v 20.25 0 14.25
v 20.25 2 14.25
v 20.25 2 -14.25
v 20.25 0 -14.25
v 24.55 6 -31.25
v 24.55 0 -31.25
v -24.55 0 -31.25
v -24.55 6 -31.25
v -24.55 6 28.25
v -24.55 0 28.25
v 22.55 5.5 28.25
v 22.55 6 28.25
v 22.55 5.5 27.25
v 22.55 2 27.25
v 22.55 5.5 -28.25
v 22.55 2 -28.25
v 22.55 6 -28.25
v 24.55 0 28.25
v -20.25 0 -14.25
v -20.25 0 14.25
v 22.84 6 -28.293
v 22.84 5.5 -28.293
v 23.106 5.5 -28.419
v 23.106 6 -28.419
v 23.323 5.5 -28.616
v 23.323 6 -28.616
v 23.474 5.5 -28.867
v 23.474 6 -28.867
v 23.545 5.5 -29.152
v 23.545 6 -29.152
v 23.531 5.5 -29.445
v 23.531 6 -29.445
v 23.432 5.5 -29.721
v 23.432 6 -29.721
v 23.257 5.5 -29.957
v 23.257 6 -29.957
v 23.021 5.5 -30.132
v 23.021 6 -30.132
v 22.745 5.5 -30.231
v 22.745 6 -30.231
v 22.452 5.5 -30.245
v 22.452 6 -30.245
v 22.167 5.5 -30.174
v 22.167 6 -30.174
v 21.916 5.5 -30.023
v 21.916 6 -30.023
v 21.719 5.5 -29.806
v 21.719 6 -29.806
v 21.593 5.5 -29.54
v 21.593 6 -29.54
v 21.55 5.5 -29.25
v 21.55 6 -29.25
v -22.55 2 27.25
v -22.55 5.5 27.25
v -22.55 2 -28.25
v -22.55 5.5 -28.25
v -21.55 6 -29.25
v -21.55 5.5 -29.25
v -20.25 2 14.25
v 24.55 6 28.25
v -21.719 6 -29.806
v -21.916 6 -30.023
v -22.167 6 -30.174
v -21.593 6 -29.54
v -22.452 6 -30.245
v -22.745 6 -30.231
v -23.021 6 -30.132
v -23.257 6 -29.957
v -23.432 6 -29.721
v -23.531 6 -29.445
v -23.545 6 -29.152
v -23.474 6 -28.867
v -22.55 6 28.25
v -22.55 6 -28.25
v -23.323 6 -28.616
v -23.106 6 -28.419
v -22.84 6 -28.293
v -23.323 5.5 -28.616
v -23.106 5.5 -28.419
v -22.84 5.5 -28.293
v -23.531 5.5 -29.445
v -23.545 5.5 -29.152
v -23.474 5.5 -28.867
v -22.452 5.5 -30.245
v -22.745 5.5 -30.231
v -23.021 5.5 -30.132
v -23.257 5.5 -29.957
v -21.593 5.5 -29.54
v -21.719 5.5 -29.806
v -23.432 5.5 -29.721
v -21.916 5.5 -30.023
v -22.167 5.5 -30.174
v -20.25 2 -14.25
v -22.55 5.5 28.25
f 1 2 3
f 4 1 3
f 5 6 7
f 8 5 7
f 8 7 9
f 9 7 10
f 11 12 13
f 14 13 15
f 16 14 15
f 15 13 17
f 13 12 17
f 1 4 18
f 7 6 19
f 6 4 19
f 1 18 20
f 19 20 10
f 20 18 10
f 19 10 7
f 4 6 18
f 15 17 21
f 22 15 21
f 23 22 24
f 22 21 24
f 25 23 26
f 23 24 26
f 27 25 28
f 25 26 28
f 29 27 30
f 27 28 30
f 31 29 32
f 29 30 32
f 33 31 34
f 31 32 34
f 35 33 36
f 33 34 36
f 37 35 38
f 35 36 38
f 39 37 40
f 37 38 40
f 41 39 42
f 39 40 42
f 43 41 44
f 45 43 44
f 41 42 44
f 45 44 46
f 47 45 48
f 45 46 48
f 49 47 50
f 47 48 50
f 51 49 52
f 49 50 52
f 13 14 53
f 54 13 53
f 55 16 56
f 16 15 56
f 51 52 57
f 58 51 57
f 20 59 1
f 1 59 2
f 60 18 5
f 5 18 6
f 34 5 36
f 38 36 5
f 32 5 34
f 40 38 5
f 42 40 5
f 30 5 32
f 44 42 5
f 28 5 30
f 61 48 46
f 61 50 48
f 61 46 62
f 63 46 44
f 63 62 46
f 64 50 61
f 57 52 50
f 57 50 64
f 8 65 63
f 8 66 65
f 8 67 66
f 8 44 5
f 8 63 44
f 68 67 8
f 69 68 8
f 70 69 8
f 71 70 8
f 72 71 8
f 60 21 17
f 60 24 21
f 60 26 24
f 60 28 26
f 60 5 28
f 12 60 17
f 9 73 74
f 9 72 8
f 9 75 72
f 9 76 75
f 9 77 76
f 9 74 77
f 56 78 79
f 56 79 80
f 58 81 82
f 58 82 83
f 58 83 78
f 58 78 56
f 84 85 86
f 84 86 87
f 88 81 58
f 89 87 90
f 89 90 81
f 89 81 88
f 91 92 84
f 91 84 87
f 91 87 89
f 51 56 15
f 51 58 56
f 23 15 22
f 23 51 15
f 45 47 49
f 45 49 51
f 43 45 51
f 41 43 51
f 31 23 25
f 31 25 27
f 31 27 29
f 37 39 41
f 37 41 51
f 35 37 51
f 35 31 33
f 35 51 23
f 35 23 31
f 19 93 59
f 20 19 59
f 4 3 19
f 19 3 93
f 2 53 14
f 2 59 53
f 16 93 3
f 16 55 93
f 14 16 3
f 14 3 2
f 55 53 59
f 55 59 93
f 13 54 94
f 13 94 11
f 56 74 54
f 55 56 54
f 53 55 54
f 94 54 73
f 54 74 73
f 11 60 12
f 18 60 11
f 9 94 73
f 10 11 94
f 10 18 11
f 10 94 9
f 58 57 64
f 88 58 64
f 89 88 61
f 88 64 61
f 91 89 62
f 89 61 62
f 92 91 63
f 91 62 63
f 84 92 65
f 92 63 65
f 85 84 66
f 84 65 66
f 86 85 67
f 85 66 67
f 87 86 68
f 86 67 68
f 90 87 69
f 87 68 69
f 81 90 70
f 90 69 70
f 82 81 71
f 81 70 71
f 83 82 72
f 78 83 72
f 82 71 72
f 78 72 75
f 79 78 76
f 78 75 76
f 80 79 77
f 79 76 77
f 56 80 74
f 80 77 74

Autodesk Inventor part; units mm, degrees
ref_plane "YZ Plane" through (0, 0, 0) normal (1, 0, 0) x (0, 1, 0)
ref_plane "XZ Plane" through (0, 0, 0) normal (0, 1, 0) x (-1, 0, 0)
ref_plane "XY Plane" through (0, 0, 0) normal (0, 0, 1) x (1, 0, 0)
sketch "Sketch1" plane through (0, 0, 0) normal (0, 1, 0) x (-1, 0, 0)
  line L0 (-24.55, -31.25) -> (24.55, -31.25)
  line L1 (24.55, -31.25) -> (24.55, 31.25)
  line L2 (24.55, 31.25) -> (-24.55, 31.25)
  line L3 (-24.55, 31.25) -> (-24.55, -31.25)
  line L4 (-24.55, -31.25) -> (24.55, 31.25) construction
  line L5 (24.55, -31.25) -> (-24.55, 31.25) construction
  point P0 (0, 0)
  dimension "d0" = 62.5
  dimension "d1" = 49.1
extrude "Extrusion1" add sketch "Sketch1" along normal blind 6
sketch "Sketch2" plane through (0, 6, 0) normal (0, 1, 0) x (1, 0, 0)
  line L0 (22.55, 29.25) -> (-22.55, 29.25)
  line L1 (-22.55, 29.25) -> (-22.55, -29.25)
  line L2 (-22.55, -29.25) -> (22.55, -29.25)
  line L3 (22.55, -29.25) -> (22.55, 29.25)
  line L4 (22.55, 29.25) -> (-22.55, -29.25) construction
  line L5 (-22.55, 29.25) -> (22.55, -29.25) construction
  line L6 (-24.55, 31.25) -> (-24.55, -31.25) projected
  line L7 (-24.55, -31.25) -> (24.55, -31.25) projected
  arc A0 (-22.55, -28.25) -> (-21.55, -29.25) centre (-22.55, -29.25) ccw
  arc A1 (21.55, -29.25) -> (22.55, -28.25) centre (22.55, -29.25) ccw
  arc A2 (-21.55, 29.25) -> (-22.55, 28.25) centre (-22.55, 29.25) ccw
  arc A3 (22.55, 28.25) -> (21.55, 29.25) centre (22.55, 29.25) ccw
  point P0 (0, 0)
  dimension "d4" = 2
  dimension "d5" = 2
  dimension "d32" = 1
  dimension "d33" = 1
  dimension "d34" = 1
  dimension "d35" = 1
extrude "Extrusion2" cut sketch "Sketch2" against normal blind 0.5
sketch "Sketch3" plane through (0, 5.5, 0) normal (0, 1, 0) x (1, 0, 0)
  line L0 (-22.55, -28.25) -> (-22.55, 28.25) projected
  line L1 (22.55, 28.25) -> (-22.55, 28.25)
  line L2 (-22.55, 28.25) -> (-22.55, -28.25)
  line L3 (-22.55, -28.25) -> (22.55, -28.25)
  line L4 (22.55, -28.25) -> (22.55, 28.25)
  line L5 (22.55, 28.25) -> (-22.55, -28.25) construction
  line L6 (-22.55, 28.25) -> (22.55, -28.25) construction
  line L7 (21.55, -29.25) -> (-21.55, -29.25) projected
  point P0 (0, 0)
  point P1 (-22.3, -29)
  point P2 (-22.3, 29)
  point P3 (22.3, -29)
  point P4 (-22.3, 28)
  point P5 (-21.55, -29.25)
  dimension "d8" = 1
extrude "Extrusion3" cut sketch "Sketch3" against normal blind 3.5
sketch "Sketch8" plane through (0, 2, 0) normal (0, 1, 0) x (1, 0, 0)
  line L0 (-20.25, -14.25) -> (20.25, -14.25)
  line L1 (20.25, -14.25) -> (20.25, 14.25)
  line L2 (20.25, 14.25) -> (-20.25, 14.25)
  line L3 (-20.25, 14.25) -> (-20.25, -14.25)
  line L4 (-20.25, -14.25) -> (20.25, 14.25) construction
  line L5 (20.25, -14.25) -> (-20.25, 14.25) construction
  point P0 (0, 0)
  dimension "d28" = 28.5
  dimension "d29" = 40.5
extrude "Extrusion6" cut sketch "Sketch8" against normal through all
sketch "Sketch9" plane through (0, 6, 0) normal (0, 1, 0) x (1, 0, 0)
  line L0 (24.55, -28.25) -> (-24.55, -28.25)
  line L1 (-24.55, -28.25) -> (-24.55, -31.25)
  line L2 (-24.55, -31.25) -> (24.55, -31.25)
  line L3 (24.55, -31.25) -> (24.55, -28.25)
  line L4 (24.55, -31.25) -> (24.55, 31.25) projected
  line L5 (-21.55, 29.25) -> (21.55, 29.25) projected
  point P0 (0, 0)
  dimension "d36" = 57.5
extrude "Extrusion7" cut sketch "Sketch9" against normal through all
sketch "Sketch10" plane through (0, 2, 0) normal (0, 1, 0) x (1, 0, 0)
  line L0 (22.55, -28.25) -> (-22.55, -28.25) projected
  line L1 (-22.55, -28.25) -> (22.55, -28.25)
  line L2 (22.55, -28.25) -> (22.55, -27.25)
  line L3 (22.55, -27.25) -> (-22.55, -27.25)
  line L4 (-22.55, -27.25) -> (-22.55, -28.25)
  point P0 (0, 0)
  dimension "d39" = 1
extrude "Extrusion8" add sketch "Sketch10" along normal up to surface (3.5 mm away)
equation "\"d5\" = d4"
equation "\"d33\" = d32"
equation "\"d34\" = d32"
equation "\"d35\" = d32"
properties part number "Module Cover" material "ABS Plastic"
